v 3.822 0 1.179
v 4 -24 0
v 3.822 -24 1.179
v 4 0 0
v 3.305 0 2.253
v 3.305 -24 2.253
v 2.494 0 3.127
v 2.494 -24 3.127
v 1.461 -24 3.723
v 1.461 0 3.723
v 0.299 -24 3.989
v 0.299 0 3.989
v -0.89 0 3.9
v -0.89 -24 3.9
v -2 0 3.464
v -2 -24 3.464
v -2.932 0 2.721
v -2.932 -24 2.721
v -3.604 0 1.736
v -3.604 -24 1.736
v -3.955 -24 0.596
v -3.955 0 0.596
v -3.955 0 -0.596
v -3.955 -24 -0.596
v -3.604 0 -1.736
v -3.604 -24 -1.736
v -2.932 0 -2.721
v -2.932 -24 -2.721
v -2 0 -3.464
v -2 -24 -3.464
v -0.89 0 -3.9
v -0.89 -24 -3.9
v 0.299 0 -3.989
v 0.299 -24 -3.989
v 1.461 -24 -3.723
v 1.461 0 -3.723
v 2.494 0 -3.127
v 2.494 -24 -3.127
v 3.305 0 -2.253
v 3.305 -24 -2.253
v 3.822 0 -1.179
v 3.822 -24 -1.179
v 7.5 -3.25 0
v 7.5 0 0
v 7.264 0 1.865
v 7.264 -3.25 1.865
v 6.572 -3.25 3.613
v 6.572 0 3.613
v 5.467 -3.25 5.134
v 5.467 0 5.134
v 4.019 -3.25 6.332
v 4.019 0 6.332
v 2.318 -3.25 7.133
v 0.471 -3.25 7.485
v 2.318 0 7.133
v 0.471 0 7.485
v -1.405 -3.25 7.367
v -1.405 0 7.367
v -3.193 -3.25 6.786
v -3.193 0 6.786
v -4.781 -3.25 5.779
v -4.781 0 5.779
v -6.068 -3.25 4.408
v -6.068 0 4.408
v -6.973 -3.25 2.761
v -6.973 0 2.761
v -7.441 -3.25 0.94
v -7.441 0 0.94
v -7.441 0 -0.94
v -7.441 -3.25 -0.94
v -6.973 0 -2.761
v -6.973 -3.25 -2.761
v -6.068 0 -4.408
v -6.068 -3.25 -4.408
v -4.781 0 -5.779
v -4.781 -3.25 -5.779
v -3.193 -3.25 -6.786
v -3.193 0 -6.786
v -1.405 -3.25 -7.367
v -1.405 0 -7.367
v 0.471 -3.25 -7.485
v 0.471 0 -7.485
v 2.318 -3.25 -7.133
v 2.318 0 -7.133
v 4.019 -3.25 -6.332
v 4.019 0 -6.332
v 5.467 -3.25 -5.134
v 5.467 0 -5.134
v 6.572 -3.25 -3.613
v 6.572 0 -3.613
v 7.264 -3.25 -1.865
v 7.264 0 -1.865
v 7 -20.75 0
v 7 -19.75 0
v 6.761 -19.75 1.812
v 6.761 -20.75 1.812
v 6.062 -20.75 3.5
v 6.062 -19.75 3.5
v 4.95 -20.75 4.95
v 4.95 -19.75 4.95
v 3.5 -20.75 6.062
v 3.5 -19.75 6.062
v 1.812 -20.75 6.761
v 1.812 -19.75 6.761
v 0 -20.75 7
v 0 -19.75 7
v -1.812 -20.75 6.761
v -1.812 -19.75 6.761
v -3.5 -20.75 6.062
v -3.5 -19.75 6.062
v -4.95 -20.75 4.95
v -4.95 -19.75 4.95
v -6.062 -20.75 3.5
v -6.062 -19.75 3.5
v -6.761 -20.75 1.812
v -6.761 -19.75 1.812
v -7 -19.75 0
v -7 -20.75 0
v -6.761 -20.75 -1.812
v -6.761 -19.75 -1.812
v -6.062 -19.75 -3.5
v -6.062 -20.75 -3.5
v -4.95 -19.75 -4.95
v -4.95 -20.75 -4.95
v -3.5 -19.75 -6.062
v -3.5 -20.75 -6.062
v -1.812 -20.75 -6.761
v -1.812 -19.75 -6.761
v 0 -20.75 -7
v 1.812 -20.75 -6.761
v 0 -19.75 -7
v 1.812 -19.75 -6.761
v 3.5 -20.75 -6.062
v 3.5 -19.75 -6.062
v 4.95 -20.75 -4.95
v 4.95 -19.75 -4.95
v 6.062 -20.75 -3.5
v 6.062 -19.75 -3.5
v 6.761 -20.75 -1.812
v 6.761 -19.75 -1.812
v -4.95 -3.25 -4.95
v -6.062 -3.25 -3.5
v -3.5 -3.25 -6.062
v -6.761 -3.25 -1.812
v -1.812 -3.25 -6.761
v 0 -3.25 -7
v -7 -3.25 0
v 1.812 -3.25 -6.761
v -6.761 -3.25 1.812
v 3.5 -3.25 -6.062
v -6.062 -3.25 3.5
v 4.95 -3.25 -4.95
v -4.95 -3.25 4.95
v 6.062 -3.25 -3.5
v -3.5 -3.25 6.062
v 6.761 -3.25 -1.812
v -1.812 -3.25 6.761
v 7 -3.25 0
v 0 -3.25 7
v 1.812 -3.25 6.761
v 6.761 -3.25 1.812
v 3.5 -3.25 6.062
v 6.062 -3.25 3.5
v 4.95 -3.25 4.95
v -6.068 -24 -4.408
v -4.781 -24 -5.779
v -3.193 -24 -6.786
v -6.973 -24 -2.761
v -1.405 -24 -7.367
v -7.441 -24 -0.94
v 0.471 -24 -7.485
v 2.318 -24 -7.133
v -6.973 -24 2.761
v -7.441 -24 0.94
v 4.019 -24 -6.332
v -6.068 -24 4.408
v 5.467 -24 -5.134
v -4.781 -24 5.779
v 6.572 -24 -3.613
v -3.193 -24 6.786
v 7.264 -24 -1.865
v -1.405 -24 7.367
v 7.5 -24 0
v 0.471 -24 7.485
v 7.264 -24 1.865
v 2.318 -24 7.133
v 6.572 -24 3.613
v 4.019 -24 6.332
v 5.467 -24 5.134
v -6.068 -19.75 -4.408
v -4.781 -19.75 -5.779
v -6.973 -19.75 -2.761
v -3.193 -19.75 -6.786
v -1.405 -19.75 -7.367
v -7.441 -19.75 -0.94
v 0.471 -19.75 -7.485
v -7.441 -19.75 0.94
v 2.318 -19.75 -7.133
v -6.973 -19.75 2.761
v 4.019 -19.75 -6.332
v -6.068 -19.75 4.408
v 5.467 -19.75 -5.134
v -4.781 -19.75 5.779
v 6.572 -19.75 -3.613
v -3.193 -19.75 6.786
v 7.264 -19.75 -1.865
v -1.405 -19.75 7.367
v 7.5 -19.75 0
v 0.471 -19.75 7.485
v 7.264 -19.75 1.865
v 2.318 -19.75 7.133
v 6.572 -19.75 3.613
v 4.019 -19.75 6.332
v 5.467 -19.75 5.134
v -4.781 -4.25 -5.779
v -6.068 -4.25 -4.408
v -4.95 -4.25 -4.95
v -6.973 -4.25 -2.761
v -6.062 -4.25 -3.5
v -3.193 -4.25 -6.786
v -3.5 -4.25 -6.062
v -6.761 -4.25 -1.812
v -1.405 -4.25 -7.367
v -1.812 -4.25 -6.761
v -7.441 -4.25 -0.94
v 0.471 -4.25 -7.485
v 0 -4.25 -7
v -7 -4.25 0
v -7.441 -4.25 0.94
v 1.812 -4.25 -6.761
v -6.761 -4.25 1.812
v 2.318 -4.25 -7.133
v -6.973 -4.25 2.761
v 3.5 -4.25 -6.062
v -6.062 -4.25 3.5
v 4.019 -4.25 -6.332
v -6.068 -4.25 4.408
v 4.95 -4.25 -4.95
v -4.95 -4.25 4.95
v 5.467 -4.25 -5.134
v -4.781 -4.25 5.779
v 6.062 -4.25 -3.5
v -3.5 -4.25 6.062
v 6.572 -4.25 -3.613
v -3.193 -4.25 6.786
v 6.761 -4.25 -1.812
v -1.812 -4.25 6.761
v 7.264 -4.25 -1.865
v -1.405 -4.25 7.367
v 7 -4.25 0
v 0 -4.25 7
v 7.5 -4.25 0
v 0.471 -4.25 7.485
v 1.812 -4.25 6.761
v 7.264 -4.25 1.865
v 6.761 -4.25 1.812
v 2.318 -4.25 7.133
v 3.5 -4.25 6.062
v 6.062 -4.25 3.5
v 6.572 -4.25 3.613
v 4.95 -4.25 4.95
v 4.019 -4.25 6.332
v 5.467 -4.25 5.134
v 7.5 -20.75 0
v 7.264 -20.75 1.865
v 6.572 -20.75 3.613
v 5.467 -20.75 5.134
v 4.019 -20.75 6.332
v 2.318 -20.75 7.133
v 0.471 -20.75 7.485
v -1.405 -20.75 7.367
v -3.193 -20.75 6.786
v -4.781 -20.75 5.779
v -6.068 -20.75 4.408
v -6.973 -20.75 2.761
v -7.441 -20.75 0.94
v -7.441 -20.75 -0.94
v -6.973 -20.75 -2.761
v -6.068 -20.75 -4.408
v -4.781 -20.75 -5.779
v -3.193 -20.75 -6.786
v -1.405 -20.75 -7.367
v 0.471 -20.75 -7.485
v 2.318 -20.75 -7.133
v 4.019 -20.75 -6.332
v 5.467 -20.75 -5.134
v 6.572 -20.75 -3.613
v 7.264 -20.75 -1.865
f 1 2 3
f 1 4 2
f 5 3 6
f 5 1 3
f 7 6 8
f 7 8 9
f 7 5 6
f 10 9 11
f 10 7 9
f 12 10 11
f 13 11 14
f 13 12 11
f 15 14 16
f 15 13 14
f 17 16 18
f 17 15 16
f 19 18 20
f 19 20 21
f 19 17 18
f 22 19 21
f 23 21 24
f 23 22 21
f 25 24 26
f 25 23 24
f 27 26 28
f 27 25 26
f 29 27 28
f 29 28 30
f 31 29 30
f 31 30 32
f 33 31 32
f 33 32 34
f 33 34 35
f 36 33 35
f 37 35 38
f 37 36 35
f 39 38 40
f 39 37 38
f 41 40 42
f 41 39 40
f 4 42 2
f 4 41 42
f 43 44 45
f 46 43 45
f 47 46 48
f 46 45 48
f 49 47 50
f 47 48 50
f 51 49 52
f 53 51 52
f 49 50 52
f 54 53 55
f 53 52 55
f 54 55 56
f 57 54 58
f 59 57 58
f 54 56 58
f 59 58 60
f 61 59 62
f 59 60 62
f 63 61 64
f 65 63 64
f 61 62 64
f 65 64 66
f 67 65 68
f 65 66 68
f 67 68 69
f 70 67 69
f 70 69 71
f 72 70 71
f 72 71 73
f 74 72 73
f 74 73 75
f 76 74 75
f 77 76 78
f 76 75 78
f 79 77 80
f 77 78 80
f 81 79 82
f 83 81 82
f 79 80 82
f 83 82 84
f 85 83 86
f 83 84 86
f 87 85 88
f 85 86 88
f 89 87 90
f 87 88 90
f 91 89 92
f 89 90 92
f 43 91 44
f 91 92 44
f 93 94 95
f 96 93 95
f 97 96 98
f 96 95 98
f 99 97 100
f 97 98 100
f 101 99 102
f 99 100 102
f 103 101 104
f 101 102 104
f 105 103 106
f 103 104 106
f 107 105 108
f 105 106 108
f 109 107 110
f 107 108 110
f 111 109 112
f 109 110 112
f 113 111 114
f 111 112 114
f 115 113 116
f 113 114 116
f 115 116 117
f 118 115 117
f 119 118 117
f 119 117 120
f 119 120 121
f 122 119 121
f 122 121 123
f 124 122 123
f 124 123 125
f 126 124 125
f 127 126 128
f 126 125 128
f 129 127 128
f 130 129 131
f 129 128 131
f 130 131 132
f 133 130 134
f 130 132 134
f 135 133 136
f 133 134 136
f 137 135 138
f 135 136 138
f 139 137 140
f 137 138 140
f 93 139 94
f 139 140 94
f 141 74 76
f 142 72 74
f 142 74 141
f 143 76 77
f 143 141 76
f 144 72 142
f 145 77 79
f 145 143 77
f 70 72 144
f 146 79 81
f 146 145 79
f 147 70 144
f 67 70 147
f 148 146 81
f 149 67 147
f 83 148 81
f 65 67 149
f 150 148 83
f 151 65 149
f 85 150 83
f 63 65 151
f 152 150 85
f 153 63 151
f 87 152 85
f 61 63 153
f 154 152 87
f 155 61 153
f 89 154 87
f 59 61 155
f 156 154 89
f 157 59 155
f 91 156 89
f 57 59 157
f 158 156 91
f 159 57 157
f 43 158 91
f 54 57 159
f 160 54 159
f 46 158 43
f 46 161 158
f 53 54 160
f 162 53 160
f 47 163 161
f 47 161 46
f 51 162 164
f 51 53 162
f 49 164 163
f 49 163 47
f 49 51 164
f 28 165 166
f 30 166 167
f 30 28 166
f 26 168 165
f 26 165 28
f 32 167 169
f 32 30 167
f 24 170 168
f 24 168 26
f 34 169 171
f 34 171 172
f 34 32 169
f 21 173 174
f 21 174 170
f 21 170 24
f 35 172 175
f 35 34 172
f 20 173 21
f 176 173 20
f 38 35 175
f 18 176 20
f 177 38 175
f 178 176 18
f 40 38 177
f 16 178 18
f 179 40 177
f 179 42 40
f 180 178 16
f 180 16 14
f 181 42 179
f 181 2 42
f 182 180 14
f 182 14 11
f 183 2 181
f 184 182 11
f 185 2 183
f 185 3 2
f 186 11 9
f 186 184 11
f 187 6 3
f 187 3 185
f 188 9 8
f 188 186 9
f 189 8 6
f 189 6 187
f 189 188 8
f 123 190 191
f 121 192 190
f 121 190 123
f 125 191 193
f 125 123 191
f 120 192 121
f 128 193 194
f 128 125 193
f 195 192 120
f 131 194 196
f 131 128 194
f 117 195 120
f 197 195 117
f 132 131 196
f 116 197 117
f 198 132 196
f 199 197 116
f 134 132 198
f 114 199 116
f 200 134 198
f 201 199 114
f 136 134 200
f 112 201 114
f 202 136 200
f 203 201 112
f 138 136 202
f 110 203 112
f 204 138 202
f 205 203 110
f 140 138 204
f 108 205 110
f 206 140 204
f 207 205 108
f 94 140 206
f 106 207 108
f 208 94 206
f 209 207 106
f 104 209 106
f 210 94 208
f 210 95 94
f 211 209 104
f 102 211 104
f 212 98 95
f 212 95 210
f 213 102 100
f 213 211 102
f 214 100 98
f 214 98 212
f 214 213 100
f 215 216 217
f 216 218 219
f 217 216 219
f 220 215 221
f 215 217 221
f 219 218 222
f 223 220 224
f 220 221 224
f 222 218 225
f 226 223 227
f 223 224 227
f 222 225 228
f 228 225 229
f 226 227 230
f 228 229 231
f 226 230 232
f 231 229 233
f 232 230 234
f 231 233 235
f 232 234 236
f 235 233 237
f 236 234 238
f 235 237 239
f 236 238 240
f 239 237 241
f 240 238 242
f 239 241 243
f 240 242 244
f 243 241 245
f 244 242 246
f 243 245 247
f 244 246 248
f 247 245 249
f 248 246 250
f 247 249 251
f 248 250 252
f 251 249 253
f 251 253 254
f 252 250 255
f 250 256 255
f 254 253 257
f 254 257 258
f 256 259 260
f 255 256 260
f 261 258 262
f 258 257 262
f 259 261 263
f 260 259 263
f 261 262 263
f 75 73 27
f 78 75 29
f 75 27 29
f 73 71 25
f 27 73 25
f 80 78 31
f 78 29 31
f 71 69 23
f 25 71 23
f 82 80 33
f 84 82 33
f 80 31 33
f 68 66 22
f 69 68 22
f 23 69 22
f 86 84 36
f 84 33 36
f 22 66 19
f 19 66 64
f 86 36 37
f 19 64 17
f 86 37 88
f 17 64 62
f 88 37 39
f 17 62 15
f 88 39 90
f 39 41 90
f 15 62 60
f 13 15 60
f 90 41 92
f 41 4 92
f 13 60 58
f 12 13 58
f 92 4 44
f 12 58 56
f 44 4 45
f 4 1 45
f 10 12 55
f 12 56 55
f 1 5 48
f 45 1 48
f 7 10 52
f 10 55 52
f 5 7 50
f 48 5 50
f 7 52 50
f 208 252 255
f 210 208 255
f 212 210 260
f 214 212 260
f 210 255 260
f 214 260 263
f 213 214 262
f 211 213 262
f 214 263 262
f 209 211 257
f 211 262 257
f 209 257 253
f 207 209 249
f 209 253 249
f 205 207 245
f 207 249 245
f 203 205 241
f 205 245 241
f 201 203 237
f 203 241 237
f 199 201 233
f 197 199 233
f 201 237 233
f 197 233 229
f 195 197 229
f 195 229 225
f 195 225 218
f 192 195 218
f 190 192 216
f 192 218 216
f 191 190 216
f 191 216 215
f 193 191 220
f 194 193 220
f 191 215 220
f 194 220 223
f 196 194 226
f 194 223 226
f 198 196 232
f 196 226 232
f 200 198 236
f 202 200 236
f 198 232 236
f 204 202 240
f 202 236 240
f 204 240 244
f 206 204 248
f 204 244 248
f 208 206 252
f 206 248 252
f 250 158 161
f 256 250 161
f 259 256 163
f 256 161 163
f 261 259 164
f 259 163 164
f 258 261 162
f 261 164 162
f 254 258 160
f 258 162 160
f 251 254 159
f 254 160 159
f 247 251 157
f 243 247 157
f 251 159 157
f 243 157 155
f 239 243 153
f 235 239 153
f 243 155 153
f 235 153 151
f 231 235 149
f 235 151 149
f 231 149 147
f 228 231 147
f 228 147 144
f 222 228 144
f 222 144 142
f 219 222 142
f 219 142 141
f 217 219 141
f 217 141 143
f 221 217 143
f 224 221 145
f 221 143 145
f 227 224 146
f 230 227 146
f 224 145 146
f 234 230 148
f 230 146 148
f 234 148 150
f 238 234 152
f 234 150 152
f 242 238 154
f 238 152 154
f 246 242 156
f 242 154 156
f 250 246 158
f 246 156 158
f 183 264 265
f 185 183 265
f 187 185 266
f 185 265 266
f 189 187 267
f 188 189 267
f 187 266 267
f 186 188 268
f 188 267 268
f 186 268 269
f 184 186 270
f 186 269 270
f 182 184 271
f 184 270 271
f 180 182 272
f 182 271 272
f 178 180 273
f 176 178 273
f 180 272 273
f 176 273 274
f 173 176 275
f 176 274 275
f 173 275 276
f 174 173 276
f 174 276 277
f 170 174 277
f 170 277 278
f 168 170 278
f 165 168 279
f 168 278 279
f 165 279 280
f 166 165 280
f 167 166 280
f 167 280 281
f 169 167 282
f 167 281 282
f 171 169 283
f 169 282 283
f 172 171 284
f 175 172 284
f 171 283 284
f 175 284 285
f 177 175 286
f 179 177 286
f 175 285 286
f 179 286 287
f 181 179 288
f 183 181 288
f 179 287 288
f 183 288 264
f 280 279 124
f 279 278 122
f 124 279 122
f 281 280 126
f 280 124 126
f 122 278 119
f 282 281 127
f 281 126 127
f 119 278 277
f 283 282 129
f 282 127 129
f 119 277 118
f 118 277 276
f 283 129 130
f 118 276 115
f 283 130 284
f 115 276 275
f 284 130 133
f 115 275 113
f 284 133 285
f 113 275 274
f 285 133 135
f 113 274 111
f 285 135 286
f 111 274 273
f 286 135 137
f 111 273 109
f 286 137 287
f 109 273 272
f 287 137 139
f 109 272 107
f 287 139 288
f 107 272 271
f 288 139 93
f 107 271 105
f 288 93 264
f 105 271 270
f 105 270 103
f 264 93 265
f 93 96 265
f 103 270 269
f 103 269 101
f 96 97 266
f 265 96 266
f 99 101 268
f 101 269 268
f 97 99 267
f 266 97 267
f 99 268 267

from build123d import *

# Parameters (mm, degrees)
F0_R     = 7.5
F0_R_2   = 4
F1_DEPTH = 3.25
F2_R     = 7
F2_R_2   = 4
F3_DEPTH = 1
F4_R     = 7.5
F4_R_2   = 7
F4_R_3   = 4
F5_DEPTH = 15.5
F6_R     = 7
F6_R_2   = 4
F7_DEPTH = 1
F8_R     = 7.5
F8_R_2   = 7
F8_R_3   = 4
F9_DEPTH = 3.25


# Not quite as in the source:
# - a feature names something its author has since deleted; it is built from what else it names


with BuildPart() as f1:
    # F0 (on Front) → F1 (new body)
    with BuildSketch(Plane.XZ):
        Circle(F0_R)
        Circle(F0_R_2, mode=Mode.SUBTRACT)
    extrude(amount=F1_DEPTH)

    # F2 (on face) → F3 (join)
    with BuildSketch(Plane.XZ.offset(3.25)):
        Circle(F2_R)
        Circle(F2_R_2, mode=Mode.SUBTRACT)
    extrude(amount=F3_DEPTH)

    # F4 (on face) → F5 (join)
    with BuildSketch(Plane.XZ.offset(4.25)):
        Circle(F4_R)
        Circle(F4_R_2, mode=Mode.SUBTRACT)
        Circle(F4_R_2)
        Circle(F4_R_3, mode=Mode.SUBTRACT)
    extrude(amount=F5_DEPTH)

    # F6 (on face) → F7 (join)
    with BuildSketch(Plane.XZ.offset(19.75)):
        Circle(F6_R)
        Circle(F6_R_2, mode=Mode.SUBTRACT)
    extrude(amount=F7_DEPTH)

    # F8 (on face) → F9 (join)
    with BuildSketch(Plane.XZ.offset(20.75)):
        Circle(F8_R)
        Circle(F8_R_2, mode=Mode.SUBTRACT)
        Circle(F8_R_2)
        Circle(F8_R_3, mode=Mode.SUBTRACT)
    extrude(amount=F9_DEPTH)


solid = f1.part
